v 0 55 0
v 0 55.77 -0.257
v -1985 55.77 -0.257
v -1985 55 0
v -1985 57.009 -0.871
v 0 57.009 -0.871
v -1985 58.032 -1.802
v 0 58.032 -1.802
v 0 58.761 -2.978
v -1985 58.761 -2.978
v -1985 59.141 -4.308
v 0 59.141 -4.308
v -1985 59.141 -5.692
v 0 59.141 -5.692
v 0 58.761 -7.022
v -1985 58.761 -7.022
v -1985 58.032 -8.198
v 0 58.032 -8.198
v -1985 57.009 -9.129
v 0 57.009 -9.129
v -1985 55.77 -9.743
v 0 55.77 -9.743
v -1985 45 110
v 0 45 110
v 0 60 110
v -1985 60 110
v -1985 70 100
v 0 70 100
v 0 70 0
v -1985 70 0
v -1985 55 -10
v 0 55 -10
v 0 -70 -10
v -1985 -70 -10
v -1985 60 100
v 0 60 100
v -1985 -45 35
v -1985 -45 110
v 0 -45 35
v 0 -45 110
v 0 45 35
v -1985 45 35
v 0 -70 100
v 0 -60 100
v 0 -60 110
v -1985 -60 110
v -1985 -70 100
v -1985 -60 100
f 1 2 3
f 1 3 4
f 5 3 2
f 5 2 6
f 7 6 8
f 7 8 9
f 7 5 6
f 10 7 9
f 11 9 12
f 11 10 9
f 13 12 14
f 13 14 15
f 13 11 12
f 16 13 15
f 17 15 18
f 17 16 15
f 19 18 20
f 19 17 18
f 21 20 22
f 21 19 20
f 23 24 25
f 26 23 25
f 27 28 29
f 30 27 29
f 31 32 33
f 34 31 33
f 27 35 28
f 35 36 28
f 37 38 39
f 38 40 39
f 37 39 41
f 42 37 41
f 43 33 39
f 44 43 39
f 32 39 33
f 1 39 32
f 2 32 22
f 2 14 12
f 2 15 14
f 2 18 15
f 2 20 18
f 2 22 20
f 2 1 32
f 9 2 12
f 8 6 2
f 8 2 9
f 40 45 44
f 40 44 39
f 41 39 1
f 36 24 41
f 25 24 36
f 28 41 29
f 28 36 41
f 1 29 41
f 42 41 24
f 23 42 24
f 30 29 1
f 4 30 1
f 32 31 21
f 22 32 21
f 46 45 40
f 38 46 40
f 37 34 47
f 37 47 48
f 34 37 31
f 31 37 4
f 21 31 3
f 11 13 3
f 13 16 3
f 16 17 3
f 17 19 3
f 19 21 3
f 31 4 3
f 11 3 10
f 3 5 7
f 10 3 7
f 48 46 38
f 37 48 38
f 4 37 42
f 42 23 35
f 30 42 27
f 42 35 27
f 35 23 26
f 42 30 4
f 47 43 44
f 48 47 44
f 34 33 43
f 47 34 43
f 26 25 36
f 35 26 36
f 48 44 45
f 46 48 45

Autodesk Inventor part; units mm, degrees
ref_plane "YZ Plane" through (0, 0, 0) normal (1, 0, 0) x (0, 1, 0)
ref_plane "XZ Plane" through (0, 0, 0) normal (0, 1, 0) x (-1, 0, 0)
ref_plane "XY Plane" through (0, 0, 0) normal (0, 0, 1) x (1, 0, 0)
sketch "Sketch1" plane through (0, 0, 0) normal (1, 0, 0) x (0, 1, 0)
  line L0 (70, 0) -> (-70, 0)
  line L1 (-70, 0) -> (-70, 100)
  line L2 (-70, 100) -> (-60, 100)
  line L3 (-60, 100) -> (-60, 110)
  line L4 (-60, 110) -> (-45, 110)
  line L5 (-45, 110) -> (-45, 95)
  line L6 (-45, 95) -> (-45, 95)
  line L7 (-45, 95) -> (-45, 35)
  line L8 (-45, 35) -> (45, 35)
  line L9 (45, 35) -> (45, 95)
  line L10 (45, 95) -> (45, 95)
  line L11 (45, 95) -> (45, 110)
  line L12 (45, 110) -> (60, 110)
  line L13 (60, 110) -> (60, 100)
  line L14 (60, 100) -> (70, 100)
  line L15 (70, 100) -> (70, 0)
  point P0 (0, 0)
  point P1 (0, 0)
  point P2 (0, 35)
  dimension "d15" = 90
  dimension "d16" = 110
  dimension "d17" = 10
  dimension "d20" = 35
  dimension "d21" = 15
  dimension "d22" = 15
  dimension "d23" = 15
  dimension "d24" = 10
  dimension "d25" = 10
  dimension "d26" = 135
  dimension "d27" = 135
  dimension "d28" = 90
extrude "Extrusion1" add sketch "Sketch1" against normal blind 1985
sketch "Sketch2" plane through (0, 0, 0) normal (1, 0, 0) x (0, 0, -1)
  line L0 (0, -70) -> (0, 70) projected
  line L1 (-110, 45) -> (-35, 45) projected
  line L2 (0, 25) -> (0, 45)
  line L3 (0, 70) -> (0, -70) projected
  line L4 (0, -70) -> (10, -70)
  line L5 (0, 55) -> (10, 55)
  line L6 (10, 55) -> (10, -70)
  line L7 (5, 55) -> (5, 30.8047) construction
  line L8 (0, 70) -> (-100, 70) projected
  line L9 (10, 55) -> (5, 70)
  line L10 (5, 70) -> (0, 55)
  point P0 (0, 0)
  point P1 (5, -70)
  point P2 (0, 55)
  dimension "d36" = 10
  dimension "d43" = 15
extrude "Extrusion2" add sketch "Sketch2" against normal up to surface (1985 mm away)
fillet "Fillet2" radius 5 1 edges at (-992.5, 70, -5)
equation "\"d22\" = d21"
equation "\"d25\" = d17"
properties part number "Zarge" material "Copper"
